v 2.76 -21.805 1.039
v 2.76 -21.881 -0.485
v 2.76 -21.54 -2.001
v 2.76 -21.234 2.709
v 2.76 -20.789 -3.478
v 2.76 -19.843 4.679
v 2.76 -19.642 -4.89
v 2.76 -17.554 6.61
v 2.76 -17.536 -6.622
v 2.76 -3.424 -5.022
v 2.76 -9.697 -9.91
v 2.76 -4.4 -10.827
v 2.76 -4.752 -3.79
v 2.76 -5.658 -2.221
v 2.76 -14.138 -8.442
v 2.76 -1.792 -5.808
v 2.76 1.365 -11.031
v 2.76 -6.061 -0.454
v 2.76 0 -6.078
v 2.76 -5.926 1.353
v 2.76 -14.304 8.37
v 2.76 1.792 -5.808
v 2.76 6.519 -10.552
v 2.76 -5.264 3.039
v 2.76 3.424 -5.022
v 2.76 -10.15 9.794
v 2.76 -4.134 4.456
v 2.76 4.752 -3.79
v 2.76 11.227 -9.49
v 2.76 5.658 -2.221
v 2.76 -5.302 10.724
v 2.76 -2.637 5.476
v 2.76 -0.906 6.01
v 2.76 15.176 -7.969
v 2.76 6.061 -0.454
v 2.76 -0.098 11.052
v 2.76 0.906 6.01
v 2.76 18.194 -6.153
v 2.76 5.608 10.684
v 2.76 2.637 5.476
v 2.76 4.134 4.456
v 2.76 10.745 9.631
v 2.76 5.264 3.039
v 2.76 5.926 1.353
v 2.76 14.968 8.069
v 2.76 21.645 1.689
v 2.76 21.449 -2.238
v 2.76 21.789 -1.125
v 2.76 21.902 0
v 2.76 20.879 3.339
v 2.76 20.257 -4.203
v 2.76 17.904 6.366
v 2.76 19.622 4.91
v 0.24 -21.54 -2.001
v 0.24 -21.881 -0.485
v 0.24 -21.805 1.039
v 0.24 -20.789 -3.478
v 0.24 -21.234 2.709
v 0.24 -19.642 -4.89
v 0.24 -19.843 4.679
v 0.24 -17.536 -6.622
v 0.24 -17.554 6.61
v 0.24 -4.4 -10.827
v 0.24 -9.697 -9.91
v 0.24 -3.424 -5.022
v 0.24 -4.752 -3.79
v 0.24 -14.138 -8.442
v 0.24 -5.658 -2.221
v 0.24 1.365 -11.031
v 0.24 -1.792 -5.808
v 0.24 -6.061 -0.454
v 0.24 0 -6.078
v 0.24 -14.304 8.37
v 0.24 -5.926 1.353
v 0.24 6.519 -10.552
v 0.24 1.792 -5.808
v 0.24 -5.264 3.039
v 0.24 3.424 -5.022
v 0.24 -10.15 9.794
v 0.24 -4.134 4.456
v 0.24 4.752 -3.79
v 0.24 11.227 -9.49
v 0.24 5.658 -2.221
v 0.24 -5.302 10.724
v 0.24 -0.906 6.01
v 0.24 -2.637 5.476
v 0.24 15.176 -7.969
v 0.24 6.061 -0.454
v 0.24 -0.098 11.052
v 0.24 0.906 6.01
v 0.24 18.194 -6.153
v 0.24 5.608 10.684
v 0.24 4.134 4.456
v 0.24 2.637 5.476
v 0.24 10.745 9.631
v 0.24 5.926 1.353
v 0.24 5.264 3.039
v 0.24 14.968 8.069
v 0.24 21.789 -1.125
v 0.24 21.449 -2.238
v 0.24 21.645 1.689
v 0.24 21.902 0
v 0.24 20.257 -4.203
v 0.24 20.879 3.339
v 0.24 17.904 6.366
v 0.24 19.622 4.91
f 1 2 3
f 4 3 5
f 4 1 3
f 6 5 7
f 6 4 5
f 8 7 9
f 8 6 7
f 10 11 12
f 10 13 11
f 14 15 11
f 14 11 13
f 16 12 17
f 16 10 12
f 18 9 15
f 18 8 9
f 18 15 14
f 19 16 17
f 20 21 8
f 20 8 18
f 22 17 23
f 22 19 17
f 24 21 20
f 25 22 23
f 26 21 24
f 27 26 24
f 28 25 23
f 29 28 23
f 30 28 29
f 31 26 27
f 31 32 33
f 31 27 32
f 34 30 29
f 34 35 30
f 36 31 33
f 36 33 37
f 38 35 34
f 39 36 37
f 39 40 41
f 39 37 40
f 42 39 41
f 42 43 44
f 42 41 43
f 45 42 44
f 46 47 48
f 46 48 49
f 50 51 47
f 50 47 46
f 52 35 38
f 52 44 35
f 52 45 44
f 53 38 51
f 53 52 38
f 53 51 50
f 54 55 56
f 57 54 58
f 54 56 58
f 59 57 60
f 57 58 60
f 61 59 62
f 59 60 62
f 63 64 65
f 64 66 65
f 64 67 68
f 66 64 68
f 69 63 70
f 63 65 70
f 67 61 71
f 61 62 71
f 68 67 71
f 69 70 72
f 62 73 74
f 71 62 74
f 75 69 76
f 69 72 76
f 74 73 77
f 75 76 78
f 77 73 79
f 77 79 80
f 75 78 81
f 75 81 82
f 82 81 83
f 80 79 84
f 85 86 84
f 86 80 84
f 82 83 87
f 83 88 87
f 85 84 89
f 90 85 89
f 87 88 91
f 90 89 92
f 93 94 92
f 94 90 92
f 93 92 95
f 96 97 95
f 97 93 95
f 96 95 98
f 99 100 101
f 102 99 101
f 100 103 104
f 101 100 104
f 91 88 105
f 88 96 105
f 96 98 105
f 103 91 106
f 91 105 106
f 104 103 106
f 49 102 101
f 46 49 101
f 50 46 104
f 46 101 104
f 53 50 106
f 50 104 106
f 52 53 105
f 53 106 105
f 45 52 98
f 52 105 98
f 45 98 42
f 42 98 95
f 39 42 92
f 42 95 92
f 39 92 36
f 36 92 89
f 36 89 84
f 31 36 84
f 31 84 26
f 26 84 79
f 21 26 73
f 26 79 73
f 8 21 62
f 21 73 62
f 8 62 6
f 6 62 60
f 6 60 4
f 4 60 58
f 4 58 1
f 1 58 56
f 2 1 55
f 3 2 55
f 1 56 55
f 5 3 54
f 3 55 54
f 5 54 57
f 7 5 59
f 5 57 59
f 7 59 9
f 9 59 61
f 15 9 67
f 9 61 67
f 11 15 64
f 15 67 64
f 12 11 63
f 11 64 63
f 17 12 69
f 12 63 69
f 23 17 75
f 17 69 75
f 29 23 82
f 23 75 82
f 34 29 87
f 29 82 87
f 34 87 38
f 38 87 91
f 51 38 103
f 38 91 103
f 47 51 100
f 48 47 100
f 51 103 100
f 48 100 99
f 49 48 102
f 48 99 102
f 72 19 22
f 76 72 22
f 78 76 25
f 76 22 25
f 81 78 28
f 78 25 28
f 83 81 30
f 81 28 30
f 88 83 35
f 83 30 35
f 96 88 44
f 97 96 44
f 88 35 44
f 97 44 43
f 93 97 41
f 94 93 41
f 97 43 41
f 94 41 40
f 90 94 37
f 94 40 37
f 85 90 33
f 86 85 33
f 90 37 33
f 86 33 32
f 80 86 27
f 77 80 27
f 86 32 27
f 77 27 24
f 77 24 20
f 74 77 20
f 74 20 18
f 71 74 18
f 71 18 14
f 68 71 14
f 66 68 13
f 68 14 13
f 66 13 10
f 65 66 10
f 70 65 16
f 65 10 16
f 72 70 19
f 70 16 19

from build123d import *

# Parameters (mm, degrees)
CROQUIS2_RX             = 26.074270712
CROQUIS2_RY             = 13.157789795
SALIENTE_EXTRUIR1_DEPTH = 3
CROQUIS3_R              = 7.236106057
CORTAR_EXTRUIR1_DEPTH   = 3
ESCALA1_SCALE           = 0.7
ESCALA2_SCALE           = 1.2


with BuildPart() as part:
    # Croquis2 → Saliente-Extruir1 (new body)
    with BuildSketch(Plane(origin=(0, 0, 0), x_dir=(0, 0, -1), z_dir=(1, 0, 0))):
        with Locations(Location((0, 0), (0, 0, 90))):
            Ellipse(CROQUIS2_RX, CROQUIS2_RY)
    extrude(amount=SALIENTE_EXTRUIR1_DEPTH)

    # Croquis3 → Cortar-Extruir1 (cut)
    with BuildSketch(Plane(origin=(3, 0, 0), x_dir=(0, 0, -1), z_dir=(1, 0, 0))):
        Circle(CROQUIS3_R)
    extrude(amount=-CORTAR_EXTRUIR1_DEPTH, mode=Mode.SUBTRACT)


with BuildPart() as part_1:
    # Escala1: scaled about (1.5, 0, 0)
    add(part.part.scale(ESCALA1_SCALE).moved(Location((0.45, 0, 0))))


with BuildPart() as part_2:
    # Escala2: scaled about (1.5, 0, 0)
    add(part_1.part.scale(ESCALA2_SCALE).moved(Location((-0.3, 0, 0))))


solid = part_2.part
